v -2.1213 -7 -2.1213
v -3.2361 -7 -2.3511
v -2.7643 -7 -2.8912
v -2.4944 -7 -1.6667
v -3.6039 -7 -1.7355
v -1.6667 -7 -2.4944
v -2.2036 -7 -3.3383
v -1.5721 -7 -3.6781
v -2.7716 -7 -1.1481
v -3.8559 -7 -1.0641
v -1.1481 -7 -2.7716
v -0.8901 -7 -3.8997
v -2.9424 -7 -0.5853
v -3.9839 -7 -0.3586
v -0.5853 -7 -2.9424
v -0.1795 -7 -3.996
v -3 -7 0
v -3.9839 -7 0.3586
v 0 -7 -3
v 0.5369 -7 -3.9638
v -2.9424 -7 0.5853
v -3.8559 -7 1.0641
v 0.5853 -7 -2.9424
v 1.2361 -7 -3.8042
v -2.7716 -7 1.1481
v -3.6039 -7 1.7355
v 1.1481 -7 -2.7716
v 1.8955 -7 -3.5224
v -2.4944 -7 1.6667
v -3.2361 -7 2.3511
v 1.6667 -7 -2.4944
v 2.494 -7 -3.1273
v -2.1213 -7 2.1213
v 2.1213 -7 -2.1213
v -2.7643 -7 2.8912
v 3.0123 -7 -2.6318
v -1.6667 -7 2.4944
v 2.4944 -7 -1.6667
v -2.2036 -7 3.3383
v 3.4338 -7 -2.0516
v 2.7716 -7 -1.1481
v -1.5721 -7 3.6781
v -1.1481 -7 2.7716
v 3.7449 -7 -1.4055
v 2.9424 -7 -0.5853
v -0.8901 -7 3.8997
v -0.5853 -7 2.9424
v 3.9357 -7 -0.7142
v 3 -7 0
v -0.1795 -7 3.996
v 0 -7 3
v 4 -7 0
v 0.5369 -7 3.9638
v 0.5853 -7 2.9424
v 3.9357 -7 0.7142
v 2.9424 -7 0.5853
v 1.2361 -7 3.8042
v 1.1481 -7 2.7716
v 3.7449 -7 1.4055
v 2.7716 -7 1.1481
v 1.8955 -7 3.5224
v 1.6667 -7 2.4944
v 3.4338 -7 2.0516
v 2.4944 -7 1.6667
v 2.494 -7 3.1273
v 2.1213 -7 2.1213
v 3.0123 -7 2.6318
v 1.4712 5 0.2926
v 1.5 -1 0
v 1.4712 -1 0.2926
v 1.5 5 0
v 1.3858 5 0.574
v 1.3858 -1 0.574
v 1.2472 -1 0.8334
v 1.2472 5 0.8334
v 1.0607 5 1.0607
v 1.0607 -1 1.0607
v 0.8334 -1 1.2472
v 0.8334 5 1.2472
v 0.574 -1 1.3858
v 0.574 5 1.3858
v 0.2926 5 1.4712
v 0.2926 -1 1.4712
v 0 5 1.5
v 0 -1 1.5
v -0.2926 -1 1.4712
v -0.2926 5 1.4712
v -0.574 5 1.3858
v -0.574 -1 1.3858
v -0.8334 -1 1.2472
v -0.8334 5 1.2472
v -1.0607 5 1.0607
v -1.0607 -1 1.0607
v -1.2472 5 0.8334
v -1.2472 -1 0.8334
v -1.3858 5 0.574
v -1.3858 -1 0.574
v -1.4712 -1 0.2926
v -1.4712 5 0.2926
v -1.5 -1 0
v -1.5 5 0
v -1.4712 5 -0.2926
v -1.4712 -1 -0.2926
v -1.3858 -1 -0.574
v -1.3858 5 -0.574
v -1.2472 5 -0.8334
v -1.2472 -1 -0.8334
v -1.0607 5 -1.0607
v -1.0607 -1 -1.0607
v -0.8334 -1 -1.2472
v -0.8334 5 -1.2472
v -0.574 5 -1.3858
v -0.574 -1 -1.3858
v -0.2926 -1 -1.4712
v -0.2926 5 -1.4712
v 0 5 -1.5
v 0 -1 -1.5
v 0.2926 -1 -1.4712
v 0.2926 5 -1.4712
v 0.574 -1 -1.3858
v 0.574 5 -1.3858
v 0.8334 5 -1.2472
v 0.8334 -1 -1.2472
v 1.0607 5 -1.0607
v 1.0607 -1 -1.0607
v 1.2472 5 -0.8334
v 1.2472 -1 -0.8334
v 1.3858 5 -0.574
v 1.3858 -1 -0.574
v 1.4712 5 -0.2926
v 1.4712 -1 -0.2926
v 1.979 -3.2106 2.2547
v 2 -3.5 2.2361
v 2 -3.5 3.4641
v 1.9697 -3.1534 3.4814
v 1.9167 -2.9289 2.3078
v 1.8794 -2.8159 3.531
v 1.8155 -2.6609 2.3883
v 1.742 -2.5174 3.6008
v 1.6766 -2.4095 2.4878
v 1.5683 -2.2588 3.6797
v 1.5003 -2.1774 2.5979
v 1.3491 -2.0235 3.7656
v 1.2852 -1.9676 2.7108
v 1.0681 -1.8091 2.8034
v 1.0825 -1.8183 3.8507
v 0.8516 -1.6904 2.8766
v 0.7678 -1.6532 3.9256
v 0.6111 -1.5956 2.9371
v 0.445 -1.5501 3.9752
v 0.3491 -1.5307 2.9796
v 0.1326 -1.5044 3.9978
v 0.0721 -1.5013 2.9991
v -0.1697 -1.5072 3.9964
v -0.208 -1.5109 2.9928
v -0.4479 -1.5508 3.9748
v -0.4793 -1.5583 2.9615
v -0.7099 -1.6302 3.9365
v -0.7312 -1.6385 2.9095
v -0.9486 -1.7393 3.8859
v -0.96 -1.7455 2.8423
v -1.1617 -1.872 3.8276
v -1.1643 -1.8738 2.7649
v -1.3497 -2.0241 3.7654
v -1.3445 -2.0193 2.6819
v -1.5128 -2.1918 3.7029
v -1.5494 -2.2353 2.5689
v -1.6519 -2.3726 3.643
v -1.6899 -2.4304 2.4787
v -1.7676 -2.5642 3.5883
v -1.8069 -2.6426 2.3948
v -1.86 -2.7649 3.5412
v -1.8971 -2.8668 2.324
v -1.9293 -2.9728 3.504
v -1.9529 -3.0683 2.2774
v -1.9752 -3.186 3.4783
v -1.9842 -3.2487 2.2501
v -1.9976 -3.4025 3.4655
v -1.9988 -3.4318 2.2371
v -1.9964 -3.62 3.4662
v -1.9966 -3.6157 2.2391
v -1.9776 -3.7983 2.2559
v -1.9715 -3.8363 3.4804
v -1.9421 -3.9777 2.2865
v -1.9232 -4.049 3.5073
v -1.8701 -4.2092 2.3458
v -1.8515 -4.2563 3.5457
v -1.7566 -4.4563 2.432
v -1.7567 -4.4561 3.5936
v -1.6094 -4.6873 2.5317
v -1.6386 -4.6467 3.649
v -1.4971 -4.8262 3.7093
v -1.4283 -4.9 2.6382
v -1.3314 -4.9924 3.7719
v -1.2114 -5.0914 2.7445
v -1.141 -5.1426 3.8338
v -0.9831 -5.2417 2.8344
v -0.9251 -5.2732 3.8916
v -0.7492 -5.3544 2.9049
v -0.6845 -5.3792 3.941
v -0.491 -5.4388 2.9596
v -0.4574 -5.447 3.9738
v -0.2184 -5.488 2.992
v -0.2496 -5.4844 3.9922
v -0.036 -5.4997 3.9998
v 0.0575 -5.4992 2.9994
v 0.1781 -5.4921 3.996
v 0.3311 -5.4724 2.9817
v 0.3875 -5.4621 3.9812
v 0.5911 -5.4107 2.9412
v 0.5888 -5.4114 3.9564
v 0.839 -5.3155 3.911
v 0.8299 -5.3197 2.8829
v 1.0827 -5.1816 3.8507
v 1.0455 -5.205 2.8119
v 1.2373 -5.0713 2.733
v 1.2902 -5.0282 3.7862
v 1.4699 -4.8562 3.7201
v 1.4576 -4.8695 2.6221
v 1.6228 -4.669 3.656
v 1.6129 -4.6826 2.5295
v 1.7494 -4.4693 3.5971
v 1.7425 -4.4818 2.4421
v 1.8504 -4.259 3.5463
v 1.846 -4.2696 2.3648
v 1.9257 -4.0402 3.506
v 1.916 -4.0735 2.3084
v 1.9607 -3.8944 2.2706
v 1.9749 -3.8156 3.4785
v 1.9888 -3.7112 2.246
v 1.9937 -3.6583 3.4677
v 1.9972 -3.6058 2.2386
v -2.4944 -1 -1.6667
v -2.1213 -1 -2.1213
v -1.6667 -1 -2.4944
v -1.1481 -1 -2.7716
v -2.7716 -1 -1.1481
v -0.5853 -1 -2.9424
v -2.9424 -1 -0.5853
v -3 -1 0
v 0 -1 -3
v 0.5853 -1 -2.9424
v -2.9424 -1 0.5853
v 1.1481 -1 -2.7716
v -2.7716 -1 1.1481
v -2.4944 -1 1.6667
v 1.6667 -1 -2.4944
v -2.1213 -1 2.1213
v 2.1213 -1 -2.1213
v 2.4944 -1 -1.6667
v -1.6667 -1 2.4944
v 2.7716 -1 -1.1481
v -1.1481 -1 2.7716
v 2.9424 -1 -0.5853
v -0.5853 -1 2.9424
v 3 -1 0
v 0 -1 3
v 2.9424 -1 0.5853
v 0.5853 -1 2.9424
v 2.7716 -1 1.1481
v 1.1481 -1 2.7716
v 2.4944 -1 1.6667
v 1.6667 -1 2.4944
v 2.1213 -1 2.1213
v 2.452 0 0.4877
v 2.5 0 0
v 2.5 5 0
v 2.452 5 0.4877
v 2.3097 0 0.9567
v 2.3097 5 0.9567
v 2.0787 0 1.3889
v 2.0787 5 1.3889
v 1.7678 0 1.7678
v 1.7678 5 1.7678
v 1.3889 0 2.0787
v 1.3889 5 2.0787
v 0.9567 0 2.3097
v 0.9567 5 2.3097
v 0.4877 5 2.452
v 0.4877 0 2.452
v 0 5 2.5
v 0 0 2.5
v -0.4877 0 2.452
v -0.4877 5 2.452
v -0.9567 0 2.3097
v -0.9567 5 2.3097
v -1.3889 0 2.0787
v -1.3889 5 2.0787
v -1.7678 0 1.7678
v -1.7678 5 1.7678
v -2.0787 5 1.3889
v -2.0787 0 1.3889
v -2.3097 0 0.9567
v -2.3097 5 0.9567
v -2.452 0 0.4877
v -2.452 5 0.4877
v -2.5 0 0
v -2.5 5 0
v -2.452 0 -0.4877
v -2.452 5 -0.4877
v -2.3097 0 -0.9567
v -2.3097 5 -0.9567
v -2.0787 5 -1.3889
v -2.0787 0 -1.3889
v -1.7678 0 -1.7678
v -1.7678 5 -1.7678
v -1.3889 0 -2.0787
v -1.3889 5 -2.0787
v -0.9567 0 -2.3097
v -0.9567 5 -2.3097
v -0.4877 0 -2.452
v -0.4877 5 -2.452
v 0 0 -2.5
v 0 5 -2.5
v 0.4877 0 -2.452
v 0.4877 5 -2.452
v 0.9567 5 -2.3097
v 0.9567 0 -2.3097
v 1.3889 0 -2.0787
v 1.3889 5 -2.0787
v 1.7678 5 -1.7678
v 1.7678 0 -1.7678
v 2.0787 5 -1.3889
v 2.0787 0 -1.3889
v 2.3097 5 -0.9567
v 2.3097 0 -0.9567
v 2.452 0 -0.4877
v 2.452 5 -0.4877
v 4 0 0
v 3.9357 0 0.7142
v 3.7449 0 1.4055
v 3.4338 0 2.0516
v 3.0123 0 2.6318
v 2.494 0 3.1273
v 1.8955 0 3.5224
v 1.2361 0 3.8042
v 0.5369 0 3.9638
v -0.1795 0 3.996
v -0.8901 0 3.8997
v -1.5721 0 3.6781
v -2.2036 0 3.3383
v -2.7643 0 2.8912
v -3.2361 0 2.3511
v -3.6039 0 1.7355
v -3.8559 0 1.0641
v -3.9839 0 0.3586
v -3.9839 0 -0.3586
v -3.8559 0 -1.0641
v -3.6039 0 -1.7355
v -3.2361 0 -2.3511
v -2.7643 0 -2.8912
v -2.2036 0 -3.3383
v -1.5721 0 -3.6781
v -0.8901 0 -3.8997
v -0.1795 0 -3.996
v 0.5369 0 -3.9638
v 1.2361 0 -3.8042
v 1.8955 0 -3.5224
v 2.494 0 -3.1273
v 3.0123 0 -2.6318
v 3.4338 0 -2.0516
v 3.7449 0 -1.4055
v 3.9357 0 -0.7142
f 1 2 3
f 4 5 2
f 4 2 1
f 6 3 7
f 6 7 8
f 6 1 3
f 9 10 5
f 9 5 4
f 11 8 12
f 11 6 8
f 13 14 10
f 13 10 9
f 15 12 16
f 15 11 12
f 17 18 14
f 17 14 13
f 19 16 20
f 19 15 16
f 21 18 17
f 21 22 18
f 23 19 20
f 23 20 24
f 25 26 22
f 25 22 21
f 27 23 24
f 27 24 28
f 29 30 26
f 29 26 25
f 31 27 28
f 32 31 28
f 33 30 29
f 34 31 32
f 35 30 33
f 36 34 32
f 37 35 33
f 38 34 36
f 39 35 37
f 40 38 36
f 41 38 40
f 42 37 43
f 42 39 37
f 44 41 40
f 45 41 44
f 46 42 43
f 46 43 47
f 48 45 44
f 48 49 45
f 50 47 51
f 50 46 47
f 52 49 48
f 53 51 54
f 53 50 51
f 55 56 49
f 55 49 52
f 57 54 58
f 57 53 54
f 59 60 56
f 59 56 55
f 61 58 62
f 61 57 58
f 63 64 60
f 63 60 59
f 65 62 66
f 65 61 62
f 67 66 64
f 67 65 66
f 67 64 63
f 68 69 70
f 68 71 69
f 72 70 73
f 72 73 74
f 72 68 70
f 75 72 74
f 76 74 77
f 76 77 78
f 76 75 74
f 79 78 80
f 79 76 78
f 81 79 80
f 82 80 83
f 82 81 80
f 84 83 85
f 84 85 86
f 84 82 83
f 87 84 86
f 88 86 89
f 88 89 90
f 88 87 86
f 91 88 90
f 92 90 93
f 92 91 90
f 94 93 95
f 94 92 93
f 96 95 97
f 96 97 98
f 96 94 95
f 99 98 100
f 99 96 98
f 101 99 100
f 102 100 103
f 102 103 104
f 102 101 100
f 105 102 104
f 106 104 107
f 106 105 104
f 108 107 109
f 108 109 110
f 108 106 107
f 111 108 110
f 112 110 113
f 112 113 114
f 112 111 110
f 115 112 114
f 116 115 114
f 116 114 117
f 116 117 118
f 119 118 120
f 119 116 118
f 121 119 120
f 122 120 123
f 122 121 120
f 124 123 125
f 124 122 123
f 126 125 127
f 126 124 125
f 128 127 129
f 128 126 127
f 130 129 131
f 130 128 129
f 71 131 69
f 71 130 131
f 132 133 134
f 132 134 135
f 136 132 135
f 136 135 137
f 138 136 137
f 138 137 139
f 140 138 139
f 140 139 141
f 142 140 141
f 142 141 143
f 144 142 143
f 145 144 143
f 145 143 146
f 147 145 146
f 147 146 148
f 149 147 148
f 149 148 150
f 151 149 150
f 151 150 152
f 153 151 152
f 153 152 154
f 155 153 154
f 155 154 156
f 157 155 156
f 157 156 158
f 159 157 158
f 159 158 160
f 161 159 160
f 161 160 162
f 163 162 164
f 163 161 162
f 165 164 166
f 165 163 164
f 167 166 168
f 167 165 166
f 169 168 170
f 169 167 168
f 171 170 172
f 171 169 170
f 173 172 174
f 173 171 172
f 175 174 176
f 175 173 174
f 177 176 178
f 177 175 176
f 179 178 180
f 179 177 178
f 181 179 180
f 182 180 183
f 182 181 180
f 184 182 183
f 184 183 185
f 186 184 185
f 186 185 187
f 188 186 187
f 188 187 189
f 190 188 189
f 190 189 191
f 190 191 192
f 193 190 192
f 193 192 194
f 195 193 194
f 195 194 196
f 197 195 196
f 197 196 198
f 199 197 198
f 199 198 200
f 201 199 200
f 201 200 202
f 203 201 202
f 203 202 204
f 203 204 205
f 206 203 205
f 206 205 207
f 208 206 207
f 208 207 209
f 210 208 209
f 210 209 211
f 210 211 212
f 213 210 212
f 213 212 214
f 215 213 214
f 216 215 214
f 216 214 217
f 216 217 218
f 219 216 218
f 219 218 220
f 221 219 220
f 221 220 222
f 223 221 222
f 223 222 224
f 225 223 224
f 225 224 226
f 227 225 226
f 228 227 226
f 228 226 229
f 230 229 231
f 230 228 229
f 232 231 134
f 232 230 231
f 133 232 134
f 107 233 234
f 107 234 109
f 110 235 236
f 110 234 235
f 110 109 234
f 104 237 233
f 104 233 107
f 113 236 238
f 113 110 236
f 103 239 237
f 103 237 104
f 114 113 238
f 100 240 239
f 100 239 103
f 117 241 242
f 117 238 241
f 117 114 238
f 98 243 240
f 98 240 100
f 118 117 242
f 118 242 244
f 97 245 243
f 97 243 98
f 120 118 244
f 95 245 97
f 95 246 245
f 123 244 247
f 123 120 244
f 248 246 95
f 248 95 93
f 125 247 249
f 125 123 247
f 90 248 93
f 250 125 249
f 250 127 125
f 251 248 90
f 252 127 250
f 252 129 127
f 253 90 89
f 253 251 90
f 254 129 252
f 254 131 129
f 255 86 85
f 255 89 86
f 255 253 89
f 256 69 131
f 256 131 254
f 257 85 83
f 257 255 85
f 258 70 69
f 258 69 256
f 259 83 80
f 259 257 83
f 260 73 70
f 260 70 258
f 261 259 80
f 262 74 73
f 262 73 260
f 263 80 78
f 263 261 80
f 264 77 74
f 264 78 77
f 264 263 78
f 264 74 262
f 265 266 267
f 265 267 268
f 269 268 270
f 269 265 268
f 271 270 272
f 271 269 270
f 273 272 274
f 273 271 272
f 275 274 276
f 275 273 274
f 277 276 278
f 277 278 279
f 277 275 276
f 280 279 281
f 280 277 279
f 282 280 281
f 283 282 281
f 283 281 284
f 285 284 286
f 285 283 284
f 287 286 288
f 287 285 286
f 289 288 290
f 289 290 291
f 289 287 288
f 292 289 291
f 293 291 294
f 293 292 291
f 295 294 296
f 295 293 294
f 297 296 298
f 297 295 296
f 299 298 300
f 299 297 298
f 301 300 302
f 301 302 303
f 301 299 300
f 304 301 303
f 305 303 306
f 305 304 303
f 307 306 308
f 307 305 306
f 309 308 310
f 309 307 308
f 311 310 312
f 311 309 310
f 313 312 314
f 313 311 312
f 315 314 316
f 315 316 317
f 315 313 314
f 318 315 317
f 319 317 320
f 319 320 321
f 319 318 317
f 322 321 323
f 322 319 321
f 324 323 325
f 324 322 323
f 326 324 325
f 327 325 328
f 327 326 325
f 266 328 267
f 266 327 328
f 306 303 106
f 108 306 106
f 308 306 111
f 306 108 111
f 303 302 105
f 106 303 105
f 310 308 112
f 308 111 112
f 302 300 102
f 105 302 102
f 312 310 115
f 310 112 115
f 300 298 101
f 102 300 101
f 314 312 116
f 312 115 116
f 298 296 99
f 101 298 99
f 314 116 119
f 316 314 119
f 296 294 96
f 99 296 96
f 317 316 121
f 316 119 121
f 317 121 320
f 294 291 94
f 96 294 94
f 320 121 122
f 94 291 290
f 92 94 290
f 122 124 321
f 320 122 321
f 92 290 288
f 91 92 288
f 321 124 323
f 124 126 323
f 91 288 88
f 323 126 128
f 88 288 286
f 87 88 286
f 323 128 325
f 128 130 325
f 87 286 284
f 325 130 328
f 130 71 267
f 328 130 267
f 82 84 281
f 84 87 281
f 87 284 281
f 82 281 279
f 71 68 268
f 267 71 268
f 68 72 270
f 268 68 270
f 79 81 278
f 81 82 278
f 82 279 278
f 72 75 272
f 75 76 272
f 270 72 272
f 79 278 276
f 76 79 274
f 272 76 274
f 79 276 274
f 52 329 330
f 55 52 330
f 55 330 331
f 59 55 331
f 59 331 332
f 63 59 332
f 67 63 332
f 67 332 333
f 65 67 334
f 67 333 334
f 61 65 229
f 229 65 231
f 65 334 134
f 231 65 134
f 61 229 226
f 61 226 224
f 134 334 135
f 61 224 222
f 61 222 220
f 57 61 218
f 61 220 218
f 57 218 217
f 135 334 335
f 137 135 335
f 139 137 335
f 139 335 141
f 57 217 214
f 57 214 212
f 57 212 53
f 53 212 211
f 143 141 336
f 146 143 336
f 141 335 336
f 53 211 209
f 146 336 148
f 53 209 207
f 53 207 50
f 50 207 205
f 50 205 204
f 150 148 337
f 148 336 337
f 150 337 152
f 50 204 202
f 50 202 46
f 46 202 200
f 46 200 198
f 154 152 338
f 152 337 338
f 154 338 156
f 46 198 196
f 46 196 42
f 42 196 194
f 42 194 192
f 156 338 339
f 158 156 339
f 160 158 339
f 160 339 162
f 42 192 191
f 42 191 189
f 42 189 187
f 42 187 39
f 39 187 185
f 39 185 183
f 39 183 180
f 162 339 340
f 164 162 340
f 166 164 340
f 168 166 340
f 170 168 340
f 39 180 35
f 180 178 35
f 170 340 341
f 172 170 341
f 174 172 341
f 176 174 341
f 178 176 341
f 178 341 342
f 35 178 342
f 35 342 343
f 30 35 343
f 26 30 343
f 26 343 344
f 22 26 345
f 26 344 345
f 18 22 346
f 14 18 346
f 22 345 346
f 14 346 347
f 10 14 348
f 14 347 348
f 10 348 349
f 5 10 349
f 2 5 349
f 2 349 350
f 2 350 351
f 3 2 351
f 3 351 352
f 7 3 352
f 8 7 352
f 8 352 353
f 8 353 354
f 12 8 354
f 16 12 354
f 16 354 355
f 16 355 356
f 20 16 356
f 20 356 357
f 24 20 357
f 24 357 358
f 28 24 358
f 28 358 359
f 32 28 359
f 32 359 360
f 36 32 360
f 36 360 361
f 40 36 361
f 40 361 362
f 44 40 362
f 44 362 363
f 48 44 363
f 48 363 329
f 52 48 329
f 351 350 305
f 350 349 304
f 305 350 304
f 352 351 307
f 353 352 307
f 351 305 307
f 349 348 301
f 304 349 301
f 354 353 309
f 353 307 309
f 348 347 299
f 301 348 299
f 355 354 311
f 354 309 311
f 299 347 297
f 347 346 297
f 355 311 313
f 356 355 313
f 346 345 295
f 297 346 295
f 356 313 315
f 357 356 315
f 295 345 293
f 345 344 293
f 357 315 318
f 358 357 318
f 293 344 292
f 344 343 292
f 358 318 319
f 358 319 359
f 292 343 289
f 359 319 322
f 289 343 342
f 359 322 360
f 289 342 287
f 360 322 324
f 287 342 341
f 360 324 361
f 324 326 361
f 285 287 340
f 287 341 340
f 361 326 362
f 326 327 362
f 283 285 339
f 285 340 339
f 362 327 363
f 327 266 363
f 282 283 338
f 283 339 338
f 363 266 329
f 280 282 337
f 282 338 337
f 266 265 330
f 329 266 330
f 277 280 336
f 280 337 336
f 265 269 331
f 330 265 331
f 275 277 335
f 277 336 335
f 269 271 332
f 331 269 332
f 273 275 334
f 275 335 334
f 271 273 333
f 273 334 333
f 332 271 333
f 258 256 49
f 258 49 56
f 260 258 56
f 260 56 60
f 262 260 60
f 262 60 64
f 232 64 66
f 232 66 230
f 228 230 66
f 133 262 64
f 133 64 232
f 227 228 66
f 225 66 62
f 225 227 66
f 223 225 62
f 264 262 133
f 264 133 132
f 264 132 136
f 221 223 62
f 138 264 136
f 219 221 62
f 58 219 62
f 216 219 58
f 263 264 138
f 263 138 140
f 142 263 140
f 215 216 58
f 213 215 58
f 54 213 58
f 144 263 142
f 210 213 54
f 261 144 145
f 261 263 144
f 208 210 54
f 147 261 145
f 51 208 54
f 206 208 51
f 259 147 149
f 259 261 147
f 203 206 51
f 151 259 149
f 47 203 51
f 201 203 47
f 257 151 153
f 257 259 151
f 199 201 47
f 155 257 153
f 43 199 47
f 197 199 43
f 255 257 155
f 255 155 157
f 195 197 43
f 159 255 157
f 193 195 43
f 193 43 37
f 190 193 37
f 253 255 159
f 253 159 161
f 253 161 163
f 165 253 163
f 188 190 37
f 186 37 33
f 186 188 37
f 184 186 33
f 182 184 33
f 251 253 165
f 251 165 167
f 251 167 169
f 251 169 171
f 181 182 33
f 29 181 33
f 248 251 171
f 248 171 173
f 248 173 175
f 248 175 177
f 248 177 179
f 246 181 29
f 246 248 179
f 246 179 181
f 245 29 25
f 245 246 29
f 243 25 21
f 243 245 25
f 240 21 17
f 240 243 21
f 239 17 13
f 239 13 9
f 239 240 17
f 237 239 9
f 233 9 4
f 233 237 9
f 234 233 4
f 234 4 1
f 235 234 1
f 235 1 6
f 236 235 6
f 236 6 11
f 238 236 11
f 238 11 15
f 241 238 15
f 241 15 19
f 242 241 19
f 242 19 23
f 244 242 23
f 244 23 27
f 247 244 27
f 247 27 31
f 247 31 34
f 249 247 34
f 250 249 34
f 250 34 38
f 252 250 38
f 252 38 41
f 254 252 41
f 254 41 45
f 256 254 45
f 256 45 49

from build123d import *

# Parameters (mm, degrees)
F0_R     = 2.5
F0_R_2   = 1.5
F1_DEPTH = 5
F0_R_3   = 4
F0_R_4   = 3
F2_DEPTH = 1
F3_DEPTH = 7
F4_R     = 2
F5_DEPTH = 25


with BuildPart() as f1:
    # F0 (on Front) → F1 (new body)
    with BuildSketch(Plane.XZ):
        Circle(F0_R)
        Circle(F0_R_2, mode=Mode.SUBTRACT)
    extrude(amount=-F1_DEPTH)

    # F0 (on Front) → F2 (join)
    with BuildSketch(Plane.XZ):
        Circle(F0_R_3)
        Circle(F0_R_4, mode=Mode.SUBTRACT)
        Circle(F0_R_4)
        Circle(F0_R, mode=Mode.SUBTRACT)
        Circle(F0_R)
        Circle(F0_R_2, mode=Mode.SUBTRACT)
    extrude(amount=F2_DEPTH)

    # F0 (on Front) → F3 (join)
    with BuildSketch(Plane.XZ):
        Circle(F0_R_3)
        Circle(F0_R_4, mode=Mode.SUBTRACT)
    extrude(amount=F3_DEPTH)

    # F4 (on Top) → F5 (cut)
    with BuildSketch(Plane.XY):
        with Locations((0, -3.5)):
            Circle(F4_R)
    extrude(amount=F5_DEPTH, mode=Mode.SUBTRACT)


solid = f1.part
